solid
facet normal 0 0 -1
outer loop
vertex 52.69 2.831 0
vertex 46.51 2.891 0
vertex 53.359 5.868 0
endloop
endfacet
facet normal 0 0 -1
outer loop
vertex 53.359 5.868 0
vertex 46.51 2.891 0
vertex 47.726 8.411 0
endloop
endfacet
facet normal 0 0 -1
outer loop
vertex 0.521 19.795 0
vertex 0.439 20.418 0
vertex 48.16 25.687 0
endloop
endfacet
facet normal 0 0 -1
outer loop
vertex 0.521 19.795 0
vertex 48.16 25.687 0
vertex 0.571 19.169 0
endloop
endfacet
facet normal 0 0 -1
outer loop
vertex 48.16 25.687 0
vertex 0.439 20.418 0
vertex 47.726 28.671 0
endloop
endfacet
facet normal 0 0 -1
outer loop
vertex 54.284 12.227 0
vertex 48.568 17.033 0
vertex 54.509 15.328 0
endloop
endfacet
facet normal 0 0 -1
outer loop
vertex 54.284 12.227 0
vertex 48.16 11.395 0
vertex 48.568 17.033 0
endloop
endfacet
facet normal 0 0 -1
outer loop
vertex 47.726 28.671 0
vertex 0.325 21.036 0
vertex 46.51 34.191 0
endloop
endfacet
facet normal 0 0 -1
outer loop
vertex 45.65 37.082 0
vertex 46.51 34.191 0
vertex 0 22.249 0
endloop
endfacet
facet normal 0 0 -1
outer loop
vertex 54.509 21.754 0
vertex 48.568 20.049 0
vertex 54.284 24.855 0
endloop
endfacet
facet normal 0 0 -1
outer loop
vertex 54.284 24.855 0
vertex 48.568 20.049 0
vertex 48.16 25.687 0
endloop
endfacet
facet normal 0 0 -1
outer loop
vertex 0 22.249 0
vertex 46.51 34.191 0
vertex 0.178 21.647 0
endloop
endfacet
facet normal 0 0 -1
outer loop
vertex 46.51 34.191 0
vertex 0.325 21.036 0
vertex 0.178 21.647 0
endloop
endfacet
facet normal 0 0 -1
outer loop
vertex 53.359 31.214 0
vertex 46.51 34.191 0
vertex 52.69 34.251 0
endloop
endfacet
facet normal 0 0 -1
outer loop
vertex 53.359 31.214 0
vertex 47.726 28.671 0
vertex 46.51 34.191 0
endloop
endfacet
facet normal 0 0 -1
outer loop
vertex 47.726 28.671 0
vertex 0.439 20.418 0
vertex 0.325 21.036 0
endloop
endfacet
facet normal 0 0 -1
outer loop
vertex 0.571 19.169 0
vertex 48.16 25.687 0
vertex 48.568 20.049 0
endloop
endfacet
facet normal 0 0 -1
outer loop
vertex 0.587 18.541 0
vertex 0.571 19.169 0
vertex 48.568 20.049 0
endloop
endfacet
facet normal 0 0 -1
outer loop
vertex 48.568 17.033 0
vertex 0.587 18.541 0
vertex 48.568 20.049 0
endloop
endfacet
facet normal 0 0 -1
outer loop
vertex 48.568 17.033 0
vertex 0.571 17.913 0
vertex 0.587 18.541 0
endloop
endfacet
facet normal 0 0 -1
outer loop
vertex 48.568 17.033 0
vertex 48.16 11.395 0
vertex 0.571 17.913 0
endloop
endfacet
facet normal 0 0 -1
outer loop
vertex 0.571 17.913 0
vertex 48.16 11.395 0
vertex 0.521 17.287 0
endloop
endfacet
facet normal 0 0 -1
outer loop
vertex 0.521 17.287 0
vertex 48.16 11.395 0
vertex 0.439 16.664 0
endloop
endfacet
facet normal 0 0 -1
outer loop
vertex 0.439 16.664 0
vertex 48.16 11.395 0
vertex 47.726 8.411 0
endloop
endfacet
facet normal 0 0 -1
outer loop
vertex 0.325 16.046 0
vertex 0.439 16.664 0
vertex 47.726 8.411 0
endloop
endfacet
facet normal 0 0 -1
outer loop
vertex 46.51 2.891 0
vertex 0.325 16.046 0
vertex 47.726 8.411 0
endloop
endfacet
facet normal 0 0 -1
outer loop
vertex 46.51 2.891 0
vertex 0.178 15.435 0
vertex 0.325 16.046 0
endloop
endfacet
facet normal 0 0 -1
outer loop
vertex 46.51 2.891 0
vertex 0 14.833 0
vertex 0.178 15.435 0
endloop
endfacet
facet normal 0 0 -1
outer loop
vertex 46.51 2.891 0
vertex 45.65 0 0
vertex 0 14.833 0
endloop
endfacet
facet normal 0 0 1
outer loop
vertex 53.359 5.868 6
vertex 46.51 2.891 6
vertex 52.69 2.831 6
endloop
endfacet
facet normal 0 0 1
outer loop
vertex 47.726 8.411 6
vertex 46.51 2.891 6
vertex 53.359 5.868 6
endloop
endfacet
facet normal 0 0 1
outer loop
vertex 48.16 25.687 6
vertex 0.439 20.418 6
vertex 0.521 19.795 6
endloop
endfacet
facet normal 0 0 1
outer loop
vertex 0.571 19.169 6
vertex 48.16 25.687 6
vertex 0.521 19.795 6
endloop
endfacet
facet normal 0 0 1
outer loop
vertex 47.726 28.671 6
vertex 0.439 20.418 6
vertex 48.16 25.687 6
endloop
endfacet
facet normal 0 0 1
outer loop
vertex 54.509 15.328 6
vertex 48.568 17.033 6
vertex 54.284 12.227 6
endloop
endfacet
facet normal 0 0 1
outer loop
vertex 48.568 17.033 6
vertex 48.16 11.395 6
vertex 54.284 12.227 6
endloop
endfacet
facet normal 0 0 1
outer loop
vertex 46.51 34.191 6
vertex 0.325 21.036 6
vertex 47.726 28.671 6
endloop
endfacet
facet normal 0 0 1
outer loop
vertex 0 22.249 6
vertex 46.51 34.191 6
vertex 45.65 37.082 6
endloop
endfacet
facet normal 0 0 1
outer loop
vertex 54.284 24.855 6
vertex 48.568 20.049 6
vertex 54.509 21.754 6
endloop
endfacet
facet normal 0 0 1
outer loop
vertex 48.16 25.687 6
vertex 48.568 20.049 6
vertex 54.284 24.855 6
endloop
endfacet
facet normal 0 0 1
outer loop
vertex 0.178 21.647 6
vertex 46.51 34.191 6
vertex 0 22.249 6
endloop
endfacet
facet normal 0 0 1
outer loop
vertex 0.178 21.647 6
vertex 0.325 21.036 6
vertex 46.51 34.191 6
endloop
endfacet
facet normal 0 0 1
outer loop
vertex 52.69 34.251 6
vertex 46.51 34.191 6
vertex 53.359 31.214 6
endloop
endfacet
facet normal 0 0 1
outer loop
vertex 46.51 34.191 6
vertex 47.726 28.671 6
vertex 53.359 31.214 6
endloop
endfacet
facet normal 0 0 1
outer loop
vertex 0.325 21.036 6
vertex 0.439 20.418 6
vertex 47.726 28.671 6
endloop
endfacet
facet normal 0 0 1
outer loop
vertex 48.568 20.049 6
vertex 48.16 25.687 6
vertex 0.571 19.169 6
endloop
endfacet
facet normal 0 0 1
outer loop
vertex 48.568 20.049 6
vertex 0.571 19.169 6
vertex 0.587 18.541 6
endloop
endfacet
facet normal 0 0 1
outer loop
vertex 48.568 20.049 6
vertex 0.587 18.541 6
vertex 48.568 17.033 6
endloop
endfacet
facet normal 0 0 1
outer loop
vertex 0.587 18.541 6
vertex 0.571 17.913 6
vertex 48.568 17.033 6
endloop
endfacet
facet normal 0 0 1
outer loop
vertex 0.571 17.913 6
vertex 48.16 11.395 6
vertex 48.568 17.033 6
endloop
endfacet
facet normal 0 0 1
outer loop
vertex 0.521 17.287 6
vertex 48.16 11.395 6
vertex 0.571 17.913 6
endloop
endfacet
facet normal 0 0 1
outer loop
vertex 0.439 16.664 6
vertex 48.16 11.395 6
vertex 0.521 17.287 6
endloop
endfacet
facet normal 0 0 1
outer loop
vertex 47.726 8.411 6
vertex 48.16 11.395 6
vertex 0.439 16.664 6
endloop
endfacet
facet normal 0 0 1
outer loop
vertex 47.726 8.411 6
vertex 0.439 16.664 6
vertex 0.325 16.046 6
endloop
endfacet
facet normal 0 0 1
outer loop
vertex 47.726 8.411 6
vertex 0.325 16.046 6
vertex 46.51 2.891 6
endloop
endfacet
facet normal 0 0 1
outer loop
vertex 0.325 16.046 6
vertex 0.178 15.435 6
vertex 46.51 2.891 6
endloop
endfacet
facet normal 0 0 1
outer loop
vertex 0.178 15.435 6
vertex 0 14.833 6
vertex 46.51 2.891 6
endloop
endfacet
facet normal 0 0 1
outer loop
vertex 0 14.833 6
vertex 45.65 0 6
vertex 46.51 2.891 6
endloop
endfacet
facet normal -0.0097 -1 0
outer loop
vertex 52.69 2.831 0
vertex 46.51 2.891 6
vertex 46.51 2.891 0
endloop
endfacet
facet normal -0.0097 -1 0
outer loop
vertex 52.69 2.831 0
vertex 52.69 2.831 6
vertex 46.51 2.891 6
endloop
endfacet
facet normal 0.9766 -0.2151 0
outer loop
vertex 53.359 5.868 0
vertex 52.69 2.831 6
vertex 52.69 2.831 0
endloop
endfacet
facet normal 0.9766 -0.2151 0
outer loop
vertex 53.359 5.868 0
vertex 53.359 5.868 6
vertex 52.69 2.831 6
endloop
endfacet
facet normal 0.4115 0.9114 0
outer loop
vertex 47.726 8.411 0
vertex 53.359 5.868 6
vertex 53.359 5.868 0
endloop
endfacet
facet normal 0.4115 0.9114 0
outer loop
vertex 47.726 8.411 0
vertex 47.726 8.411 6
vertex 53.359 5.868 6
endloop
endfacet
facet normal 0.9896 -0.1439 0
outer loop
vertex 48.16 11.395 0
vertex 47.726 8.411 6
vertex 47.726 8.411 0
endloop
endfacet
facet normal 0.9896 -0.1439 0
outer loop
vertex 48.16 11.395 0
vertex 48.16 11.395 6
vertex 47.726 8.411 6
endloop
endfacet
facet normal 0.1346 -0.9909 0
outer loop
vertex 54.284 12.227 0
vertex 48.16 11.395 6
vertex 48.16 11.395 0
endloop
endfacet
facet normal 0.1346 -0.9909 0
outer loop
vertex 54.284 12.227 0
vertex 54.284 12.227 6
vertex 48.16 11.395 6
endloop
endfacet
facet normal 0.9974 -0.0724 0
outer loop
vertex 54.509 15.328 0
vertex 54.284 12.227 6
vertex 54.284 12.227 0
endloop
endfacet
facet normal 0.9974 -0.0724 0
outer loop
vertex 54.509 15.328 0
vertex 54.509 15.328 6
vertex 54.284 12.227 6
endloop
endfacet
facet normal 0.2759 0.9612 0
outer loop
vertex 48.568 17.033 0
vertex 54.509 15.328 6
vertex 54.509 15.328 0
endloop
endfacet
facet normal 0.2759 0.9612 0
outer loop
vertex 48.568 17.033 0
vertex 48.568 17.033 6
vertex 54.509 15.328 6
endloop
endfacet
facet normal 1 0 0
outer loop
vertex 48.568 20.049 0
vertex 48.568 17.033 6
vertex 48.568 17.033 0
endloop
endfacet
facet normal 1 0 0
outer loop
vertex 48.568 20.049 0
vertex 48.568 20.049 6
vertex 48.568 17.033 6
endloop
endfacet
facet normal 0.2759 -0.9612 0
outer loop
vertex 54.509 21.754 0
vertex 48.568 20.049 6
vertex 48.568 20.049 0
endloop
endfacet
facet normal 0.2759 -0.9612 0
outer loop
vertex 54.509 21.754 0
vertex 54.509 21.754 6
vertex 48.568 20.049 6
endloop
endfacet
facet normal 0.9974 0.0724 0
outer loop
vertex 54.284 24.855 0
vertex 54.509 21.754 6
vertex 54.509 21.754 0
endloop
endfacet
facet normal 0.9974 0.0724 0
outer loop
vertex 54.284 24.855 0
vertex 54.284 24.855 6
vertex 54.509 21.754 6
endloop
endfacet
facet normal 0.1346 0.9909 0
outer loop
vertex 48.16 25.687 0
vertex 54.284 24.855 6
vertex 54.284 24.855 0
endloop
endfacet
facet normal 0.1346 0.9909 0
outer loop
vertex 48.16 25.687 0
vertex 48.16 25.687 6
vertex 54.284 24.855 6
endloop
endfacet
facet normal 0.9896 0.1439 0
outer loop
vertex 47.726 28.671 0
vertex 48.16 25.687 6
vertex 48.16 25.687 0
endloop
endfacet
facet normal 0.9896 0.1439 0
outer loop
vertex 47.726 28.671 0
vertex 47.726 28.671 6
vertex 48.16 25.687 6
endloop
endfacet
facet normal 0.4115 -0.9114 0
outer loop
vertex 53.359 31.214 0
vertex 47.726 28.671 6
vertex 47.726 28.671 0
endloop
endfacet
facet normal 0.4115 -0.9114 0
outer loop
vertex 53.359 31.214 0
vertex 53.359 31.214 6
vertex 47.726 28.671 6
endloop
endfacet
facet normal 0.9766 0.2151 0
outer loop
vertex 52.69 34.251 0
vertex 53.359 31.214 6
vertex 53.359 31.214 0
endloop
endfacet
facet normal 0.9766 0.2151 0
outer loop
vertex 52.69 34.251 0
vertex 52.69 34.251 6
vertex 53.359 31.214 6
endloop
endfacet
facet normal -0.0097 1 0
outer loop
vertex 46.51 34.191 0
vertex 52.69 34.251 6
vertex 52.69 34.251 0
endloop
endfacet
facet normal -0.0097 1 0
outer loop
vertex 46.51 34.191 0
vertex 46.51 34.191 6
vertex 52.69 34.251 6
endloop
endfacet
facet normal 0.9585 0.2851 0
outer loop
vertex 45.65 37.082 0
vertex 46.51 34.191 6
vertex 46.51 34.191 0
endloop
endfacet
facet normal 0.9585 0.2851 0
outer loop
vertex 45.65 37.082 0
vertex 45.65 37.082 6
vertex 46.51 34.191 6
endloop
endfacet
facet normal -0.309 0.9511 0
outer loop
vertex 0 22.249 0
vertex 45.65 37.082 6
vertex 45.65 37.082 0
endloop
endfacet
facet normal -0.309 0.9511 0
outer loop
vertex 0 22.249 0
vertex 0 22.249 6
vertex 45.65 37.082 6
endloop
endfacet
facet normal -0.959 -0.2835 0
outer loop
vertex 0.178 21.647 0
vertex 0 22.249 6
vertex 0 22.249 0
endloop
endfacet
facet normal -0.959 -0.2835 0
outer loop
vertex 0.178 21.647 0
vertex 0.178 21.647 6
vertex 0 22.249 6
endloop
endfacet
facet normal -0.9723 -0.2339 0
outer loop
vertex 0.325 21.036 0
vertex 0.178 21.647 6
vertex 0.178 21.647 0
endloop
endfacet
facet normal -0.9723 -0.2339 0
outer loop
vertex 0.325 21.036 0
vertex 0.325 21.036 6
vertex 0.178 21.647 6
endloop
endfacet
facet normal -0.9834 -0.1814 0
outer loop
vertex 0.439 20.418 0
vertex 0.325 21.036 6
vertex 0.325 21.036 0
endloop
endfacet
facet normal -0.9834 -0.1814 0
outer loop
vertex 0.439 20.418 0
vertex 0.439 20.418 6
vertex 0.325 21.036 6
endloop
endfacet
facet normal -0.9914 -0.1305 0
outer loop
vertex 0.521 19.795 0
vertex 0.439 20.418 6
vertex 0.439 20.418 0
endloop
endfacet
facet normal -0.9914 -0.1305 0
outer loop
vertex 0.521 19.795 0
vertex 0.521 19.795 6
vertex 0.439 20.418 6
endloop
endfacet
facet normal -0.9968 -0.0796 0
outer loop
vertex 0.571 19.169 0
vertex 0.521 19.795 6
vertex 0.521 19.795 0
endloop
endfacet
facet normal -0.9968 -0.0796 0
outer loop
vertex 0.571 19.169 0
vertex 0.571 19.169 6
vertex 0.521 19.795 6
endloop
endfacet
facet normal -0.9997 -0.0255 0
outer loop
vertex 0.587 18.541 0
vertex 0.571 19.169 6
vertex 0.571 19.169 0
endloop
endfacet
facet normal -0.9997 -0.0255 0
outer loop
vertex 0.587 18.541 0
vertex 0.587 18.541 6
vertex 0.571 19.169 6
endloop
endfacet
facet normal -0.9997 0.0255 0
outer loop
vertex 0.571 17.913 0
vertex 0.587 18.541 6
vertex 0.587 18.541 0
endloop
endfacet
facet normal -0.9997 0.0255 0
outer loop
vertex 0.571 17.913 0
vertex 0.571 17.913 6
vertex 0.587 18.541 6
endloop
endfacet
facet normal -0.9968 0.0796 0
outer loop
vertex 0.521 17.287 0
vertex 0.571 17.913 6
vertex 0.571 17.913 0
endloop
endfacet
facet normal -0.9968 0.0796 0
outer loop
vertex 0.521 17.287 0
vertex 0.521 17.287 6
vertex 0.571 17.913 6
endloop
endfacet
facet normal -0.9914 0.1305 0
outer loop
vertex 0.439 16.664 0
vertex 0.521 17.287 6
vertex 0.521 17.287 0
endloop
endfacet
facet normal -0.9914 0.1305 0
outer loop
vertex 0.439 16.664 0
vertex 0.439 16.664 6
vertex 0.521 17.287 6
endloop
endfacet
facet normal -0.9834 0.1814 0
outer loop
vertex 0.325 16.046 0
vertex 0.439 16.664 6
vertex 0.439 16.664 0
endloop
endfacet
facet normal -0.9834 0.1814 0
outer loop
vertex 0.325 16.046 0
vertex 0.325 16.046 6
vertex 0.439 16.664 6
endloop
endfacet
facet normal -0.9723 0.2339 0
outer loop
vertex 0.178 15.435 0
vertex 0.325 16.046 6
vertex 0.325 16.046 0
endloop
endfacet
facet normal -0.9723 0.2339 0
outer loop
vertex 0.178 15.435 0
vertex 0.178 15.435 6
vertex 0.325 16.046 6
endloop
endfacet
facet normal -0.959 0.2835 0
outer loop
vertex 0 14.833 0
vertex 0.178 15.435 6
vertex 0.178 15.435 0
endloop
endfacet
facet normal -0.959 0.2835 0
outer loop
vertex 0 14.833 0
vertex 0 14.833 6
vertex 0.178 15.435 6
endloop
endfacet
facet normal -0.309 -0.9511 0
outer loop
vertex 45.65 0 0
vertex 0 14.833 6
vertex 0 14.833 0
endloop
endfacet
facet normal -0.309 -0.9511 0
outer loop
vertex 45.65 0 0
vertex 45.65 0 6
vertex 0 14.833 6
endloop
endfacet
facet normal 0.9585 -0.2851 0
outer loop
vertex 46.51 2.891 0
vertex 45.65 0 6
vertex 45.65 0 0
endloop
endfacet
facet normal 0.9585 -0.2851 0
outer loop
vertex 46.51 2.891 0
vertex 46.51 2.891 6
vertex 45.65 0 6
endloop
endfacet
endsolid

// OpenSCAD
$fn = 32;

// ----------------------------------------------------------------------
// Gear sector: 4 teeth on 36 degrees
// ----------------------------------------------------------------------

// --- parameters (mm) ---
sector_angle = 36;        // sector angle, degrees
root_r = 60;              // root circle radius
tooth_h = 6;              // tooth height over the root circle
teeth = 4;                // number of teeth on the sector
hub_r = 12;               // hub bore radius
plate_t = 6;              // sector thickness, Z
arc_step = 3;             // sampling step of the root/hub arcs, degrees

tip_r = root_r + tooth_h;  // tip circle radius

profile = [[45.65, 0], [46.51, 2.891], [52.69, 2.831], [53.359, 5.868], [47.726, 8.411], [48.16, 11.395], [54.284, 12.227], [54.509, 15.328], [48.568, 17.033], [48.568, 20.049], [54.509, 21.754], [54.284, 24.855], [48.16, 25.687], [47.726, 28.671], [53.359, 31.214], [52.69, 34.251], [46.51, 34.191], [45.65, 37.082], [0, 22.249], [0.178, 21.647], [0.325, 21.036], [0.439, 20.418], [0.521, 19.795], [0.571, 19.169], [0.587, 18.541], [0.571, 17.913], [0.521, 17.287], [0.439, 16.664], [0.325, 16.046], [0.178, 15.435], [0, 14.833]];  // primary outline, 31 points, counter clockwise

// --- the one profile operation ---
linear_extrude(height = plate_t) polygon(points = profile);
